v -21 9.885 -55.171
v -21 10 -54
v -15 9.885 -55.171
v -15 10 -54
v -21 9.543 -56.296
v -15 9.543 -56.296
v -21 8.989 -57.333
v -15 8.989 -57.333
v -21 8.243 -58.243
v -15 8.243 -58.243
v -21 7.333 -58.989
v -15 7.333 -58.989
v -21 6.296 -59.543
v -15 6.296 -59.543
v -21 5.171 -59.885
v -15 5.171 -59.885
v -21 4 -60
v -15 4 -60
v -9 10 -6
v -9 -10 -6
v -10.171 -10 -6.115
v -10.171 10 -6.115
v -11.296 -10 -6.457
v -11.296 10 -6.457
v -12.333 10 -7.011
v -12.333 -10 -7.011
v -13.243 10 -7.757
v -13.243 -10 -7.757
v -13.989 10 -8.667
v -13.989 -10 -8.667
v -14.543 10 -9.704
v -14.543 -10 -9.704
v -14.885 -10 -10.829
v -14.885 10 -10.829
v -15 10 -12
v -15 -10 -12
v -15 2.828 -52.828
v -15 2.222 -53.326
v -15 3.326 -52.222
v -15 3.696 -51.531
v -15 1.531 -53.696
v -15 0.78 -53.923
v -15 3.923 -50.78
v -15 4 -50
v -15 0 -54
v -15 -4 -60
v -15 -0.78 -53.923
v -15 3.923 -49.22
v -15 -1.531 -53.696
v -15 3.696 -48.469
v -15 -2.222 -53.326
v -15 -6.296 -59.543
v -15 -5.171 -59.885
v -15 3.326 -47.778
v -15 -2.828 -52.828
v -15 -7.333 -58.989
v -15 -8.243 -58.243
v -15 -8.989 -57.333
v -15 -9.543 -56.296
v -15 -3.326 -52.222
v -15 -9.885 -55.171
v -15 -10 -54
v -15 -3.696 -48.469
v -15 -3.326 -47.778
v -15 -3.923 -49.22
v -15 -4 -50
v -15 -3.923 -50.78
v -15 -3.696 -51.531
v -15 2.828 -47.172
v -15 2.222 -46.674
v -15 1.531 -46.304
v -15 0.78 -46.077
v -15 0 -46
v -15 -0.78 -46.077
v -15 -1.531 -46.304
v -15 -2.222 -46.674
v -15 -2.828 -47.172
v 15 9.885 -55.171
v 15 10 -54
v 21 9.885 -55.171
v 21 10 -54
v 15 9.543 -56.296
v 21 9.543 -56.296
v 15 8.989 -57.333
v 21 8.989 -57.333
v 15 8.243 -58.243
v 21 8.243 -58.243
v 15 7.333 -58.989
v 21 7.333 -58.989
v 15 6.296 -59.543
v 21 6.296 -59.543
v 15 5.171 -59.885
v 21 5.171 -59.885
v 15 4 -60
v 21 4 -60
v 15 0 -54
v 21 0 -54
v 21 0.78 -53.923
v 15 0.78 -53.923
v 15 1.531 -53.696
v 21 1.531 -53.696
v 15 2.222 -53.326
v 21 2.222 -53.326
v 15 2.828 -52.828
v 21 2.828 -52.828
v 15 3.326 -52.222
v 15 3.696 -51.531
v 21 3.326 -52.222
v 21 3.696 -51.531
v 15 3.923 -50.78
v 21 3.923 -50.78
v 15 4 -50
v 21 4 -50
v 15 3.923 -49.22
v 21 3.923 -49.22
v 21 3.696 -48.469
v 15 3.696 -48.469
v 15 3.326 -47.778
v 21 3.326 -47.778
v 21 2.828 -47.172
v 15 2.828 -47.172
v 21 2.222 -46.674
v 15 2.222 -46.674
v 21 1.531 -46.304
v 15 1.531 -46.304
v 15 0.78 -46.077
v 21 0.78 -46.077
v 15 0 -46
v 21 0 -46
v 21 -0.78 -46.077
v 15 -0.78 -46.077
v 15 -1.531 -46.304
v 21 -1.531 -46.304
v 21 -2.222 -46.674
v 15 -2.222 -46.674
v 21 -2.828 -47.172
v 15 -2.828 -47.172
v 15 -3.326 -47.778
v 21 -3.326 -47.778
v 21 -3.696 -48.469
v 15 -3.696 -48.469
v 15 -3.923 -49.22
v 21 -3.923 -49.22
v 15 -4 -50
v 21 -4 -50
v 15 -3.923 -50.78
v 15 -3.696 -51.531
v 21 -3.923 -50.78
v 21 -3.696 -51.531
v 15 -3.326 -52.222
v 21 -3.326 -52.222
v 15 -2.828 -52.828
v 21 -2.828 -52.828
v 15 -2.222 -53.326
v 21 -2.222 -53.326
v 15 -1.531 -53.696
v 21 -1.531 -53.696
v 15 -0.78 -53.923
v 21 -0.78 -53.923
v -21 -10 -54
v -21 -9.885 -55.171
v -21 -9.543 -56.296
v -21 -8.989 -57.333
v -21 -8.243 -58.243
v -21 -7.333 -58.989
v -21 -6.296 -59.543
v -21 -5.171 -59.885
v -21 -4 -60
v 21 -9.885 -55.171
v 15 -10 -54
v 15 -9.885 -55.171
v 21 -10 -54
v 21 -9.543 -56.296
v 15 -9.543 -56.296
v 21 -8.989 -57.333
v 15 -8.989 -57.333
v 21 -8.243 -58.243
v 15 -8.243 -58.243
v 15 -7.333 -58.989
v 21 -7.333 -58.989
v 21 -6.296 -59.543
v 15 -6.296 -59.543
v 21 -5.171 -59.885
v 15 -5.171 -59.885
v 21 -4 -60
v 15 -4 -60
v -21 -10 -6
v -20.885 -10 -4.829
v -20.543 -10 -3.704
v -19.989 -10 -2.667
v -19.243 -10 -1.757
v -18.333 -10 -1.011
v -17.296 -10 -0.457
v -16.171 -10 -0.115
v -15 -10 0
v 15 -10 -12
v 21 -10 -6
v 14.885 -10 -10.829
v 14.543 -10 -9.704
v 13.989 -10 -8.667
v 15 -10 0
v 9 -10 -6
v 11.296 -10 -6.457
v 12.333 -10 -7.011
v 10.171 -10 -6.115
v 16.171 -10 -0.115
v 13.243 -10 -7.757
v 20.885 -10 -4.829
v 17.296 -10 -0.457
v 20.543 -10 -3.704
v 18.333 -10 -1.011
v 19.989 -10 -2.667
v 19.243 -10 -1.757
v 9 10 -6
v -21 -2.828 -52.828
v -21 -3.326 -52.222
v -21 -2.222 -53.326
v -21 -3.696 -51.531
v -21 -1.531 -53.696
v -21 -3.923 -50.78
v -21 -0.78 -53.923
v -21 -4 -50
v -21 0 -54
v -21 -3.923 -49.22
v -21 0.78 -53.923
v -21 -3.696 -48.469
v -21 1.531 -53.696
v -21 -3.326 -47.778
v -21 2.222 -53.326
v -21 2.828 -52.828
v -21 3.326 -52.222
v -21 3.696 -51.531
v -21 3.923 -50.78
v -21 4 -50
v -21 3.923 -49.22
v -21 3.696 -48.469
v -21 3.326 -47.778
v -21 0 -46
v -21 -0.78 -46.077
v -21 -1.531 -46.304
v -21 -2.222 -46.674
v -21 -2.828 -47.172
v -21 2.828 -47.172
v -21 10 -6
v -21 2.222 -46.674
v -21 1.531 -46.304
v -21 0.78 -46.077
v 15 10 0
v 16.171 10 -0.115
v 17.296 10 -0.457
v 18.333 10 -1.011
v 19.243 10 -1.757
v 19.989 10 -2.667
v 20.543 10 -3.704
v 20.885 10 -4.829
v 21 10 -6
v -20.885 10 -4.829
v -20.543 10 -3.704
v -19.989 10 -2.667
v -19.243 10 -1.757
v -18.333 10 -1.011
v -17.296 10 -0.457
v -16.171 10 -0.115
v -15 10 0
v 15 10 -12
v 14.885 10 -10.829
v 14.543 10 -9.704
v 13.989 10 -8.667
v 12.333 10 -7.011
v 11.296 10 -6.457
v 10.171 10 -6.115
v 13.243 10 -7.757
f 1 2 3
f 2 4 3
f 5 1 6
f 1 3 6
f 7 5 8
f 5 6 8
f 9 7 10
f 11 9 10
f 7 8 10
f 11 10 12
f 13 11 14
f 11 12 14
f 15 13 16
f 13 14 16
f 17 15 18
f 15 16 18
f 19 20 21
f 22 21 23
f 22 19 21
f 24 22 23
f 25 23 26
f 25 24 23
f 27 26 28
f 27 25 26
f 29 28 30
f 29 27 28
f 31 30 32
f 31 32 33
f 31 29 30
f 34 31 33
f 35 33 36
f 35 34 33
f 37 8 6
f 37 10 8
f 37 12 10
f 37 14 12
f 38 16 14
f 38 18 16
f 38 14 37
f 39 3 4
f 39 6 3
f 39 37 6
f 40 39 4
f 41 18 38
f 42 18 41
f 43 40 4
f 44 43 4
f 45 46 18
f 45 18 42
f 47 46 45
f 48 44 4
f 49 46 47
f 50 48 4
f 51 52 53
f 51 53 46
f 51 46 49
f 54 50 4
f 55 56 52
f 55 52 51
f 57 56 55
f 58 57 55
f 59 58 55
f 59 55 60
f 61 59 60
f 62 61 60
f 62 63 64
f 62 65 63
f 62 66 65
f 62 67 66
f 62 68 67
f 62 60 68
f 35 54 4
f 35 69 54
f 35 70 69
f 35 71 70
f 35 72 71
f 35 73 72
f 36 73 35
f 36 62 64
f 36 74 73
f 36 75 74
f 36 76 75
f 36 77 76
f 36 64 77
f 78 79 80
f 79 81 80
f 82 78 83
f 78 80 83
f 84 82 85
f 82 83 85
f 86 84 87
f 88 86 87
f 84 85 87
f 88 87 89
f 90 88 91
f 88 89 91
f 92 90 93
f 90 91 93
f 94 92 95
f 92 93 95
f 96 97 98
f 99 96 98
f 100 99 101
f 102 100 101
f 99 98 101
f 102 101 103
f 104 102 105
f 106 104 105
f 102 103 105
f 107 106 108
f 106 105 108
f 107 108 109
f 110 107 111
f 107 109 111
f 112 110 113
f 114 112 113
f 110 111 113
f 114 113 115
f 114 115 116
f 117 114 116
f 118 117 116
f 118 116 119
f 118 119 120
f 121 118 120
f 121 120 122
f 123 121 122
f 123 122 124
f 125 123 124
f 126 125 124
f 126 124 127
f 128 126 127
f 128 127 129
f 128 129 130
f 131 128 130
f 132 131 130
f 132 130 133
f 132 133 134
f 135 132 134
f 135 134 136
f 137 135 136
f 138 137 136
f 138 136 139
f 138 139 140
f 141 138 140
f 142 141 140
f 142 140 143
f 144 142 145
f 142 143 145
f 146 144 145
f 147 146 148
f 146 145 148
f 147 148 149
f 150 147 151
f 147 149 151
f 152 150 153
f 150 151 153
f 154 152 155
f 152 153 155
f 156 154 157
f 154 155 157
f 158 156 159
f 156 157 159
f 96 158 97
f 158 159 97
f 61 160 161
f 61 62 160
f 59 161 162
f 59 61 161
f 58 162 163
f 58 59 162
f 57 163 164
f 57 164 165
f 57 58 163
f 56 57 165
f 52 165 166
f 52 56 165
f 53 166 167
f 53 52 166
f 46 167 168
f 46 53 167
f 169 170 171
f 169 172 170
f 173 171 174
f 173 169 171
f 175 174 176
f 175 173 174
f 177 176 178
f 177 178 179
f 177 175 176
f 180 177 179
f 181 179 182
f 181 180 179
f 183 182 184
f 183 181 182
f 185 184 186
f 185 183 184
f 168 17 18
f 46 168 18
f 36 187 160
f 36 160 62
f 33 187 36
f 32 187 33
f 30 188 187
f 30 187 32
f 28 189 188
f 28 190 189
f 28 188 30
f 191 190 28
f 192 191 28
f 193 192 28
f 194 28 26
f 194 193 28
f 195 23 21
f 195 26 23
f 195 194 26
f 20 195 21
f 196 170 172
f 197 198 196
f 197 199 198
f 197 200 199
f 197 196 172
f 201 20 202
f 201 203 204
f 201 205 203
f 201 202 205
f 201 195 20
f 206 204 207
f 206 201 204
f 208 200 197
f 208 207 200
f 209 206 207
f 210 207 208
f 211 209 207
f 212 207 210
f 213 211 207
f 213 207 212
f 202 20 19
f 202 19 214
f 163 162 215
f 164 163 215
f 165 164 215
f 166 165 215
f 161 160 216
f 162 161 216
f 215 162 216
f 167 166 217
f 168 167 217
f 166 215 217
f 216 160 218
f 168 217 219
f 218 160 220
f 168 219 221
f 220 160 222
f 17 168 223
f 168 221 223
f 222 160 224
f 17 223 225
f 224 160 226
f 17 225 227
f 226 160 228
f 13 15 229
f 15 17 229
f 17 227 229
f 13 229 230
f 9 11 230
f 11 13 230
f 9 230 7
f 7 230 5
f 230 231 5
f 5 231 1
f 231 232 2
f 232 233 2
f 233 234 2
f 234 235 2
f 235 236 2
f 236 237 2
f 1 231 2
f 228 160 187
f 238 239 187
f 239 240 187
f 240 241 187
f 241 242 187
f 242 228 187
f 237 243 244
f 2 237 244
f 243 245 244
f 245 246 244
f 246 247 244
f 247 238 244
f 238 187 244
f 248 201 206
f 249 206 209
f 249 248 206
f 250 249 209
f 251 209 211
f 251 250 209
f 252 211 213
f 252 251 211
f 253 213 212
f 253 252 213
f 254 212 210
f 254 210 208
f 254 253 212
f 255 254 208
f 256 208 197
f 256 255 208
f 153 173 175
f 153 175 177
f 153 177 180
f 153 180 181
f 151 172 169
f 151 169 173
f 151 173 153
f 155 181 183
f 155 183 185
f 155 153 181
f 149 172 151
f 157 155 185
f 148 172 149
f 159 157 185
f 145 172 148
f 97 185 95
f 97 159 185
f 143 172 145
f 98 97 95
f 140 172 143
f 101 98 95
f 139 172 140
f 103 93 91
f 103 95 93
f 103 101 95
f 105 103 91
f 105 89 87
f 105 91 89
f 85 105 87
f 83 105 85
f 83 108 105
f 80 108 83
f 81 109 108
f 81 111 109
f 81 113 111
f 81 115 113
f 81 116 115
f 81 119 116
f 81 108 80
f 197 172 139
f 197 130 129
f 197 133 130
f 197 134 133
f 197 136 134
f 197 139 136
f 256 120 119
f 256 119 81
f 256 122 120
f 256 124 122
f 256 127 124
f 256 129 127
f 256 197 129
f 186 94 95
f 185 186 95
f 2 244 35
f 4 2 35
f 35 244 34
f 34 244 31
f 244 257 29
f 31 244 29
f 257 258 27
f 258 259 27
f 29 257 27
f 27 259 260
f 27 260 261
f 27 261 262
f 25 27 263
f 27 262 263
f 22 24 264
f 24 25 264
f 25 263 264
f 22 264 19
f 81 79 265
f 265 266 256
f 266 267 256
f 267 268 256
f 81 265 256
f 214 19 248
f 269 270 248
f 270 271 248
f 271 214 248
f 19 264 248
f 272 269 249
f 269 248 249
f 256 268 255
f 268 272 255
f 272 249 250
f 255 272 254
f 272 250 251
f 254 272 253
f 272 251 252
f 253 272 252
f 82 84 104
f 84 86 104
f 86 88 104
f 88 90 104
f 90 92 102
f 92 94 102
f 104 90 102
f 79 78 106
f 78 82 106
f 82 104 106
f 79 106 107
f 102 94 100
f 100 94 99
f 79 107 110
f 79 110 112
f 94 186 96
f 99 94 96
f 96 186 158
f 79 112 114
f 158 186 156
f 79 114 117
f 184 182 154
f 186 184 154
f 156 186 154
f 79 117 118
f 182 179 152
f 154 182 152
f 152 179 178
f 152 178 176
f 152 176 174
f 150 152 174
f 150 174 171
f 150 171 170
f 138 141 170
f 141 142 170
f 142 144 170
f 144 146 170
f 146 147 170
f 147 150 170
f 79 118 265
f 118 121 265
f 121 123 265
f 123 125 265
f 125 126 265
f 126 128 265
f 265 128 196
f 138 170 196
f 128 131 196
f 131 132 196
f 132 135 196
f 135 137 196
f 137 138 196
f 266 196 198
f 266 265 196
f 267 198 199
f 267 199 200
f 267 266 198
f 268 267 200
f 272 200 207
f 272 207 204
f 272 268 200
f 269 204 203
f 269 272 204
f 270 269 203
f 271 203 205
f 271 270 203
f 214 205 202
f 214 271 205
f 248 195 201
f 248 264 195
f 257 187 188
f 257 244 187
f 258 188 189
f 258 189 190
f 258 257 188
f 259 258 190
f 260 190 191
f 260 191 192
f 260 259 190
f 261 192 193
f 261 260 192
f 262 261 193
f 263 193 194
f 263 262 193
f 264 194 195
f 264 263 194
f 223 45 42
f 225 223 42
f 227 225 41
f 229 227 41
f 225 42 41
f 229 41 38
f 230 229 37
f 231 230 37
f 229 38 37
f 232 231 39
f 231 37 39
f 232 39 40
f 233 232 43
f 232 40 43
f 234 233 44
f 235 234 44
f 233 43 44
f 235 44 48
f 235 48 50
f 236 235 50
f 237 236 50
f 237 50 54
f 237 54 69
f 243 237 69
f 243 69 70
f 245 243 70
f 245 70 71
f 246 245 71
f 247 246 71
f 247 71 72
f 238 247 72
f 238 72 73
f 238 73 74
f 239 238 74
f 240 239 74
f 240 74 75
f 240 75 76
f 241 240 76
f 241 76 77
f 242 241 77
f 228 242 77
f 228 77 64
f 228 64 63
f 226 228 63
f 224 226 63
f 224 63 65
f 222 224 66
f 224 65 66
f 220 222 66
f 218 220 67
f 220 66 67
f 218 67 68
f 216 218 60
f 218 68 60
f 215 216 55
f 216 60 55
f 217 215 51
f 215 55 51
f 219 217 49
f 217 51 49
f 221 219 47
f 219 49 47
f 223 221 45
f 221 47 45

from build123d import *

# Parameters (mm, degrees)
SKETCH_1_W          = 42
SKETCH_1_H          = 20
EXTRUDE_1_DEPTH     = 60
SKETCH_3_W          = 30
SKETCH_3_H          = 54
CUT_EXTRUDE_1_DEPTH = 67.640828326
FILLET_1_R          = 6
SKETCH_4_R          = 4
CUT_EXTRUDE_2_DEPTH = 74.91887445


with BuildPart() as part:
    # 草图1 → 凸台-拉伸1 (new body)
    with BuildSketch(Plane.XY):
        Rectangle(SKETCH_1_W, SKETCH_1_H)
    extrude(amount=-EXTRUDE_1_DEPTH)

    # 草图3 → 切除-拉伸1 (cut, through all)
    with BuildSketch(Plane.XZ.offset(10)):
        with Locations((0, -33)):
            Rectangle(SKETCH_3_W, SKETCH_3_H)
    extrude(amount=-CUT_EXTRUDE_1_DEPTH, mode=Mode.SUBTRACT)

    # 圆角1
    fillet_1_edges = [part.edges().sort_by_distance(p)[0] for p in [
        (18, 10, -60),
        (-18, 10, -60),
        (18, -10, -60),
        (-15, 0, -6),
        (15, 0, -6),
        (21, 0, 0),
        (-21, 0, 0),
        (-18, -10, -60),
    ]]
    fillet(fillet_1_edges, radius=FILLET_1_R)

    # 草图4 → 切除-拉伸2 (cut, through all)
    with BuildSketch(Plane(origin=(21, 0, 0), x_dir=(0, 0, -1), z_dir=(1, 0, 0))):
        with Locations((50, 0)):
            Circle(SKETCH_4_R)
    extrude(amount=-CUT_EXTRUDE_2_DEPTH, mode=Mode.SUBTRACT)


solid = part.part
